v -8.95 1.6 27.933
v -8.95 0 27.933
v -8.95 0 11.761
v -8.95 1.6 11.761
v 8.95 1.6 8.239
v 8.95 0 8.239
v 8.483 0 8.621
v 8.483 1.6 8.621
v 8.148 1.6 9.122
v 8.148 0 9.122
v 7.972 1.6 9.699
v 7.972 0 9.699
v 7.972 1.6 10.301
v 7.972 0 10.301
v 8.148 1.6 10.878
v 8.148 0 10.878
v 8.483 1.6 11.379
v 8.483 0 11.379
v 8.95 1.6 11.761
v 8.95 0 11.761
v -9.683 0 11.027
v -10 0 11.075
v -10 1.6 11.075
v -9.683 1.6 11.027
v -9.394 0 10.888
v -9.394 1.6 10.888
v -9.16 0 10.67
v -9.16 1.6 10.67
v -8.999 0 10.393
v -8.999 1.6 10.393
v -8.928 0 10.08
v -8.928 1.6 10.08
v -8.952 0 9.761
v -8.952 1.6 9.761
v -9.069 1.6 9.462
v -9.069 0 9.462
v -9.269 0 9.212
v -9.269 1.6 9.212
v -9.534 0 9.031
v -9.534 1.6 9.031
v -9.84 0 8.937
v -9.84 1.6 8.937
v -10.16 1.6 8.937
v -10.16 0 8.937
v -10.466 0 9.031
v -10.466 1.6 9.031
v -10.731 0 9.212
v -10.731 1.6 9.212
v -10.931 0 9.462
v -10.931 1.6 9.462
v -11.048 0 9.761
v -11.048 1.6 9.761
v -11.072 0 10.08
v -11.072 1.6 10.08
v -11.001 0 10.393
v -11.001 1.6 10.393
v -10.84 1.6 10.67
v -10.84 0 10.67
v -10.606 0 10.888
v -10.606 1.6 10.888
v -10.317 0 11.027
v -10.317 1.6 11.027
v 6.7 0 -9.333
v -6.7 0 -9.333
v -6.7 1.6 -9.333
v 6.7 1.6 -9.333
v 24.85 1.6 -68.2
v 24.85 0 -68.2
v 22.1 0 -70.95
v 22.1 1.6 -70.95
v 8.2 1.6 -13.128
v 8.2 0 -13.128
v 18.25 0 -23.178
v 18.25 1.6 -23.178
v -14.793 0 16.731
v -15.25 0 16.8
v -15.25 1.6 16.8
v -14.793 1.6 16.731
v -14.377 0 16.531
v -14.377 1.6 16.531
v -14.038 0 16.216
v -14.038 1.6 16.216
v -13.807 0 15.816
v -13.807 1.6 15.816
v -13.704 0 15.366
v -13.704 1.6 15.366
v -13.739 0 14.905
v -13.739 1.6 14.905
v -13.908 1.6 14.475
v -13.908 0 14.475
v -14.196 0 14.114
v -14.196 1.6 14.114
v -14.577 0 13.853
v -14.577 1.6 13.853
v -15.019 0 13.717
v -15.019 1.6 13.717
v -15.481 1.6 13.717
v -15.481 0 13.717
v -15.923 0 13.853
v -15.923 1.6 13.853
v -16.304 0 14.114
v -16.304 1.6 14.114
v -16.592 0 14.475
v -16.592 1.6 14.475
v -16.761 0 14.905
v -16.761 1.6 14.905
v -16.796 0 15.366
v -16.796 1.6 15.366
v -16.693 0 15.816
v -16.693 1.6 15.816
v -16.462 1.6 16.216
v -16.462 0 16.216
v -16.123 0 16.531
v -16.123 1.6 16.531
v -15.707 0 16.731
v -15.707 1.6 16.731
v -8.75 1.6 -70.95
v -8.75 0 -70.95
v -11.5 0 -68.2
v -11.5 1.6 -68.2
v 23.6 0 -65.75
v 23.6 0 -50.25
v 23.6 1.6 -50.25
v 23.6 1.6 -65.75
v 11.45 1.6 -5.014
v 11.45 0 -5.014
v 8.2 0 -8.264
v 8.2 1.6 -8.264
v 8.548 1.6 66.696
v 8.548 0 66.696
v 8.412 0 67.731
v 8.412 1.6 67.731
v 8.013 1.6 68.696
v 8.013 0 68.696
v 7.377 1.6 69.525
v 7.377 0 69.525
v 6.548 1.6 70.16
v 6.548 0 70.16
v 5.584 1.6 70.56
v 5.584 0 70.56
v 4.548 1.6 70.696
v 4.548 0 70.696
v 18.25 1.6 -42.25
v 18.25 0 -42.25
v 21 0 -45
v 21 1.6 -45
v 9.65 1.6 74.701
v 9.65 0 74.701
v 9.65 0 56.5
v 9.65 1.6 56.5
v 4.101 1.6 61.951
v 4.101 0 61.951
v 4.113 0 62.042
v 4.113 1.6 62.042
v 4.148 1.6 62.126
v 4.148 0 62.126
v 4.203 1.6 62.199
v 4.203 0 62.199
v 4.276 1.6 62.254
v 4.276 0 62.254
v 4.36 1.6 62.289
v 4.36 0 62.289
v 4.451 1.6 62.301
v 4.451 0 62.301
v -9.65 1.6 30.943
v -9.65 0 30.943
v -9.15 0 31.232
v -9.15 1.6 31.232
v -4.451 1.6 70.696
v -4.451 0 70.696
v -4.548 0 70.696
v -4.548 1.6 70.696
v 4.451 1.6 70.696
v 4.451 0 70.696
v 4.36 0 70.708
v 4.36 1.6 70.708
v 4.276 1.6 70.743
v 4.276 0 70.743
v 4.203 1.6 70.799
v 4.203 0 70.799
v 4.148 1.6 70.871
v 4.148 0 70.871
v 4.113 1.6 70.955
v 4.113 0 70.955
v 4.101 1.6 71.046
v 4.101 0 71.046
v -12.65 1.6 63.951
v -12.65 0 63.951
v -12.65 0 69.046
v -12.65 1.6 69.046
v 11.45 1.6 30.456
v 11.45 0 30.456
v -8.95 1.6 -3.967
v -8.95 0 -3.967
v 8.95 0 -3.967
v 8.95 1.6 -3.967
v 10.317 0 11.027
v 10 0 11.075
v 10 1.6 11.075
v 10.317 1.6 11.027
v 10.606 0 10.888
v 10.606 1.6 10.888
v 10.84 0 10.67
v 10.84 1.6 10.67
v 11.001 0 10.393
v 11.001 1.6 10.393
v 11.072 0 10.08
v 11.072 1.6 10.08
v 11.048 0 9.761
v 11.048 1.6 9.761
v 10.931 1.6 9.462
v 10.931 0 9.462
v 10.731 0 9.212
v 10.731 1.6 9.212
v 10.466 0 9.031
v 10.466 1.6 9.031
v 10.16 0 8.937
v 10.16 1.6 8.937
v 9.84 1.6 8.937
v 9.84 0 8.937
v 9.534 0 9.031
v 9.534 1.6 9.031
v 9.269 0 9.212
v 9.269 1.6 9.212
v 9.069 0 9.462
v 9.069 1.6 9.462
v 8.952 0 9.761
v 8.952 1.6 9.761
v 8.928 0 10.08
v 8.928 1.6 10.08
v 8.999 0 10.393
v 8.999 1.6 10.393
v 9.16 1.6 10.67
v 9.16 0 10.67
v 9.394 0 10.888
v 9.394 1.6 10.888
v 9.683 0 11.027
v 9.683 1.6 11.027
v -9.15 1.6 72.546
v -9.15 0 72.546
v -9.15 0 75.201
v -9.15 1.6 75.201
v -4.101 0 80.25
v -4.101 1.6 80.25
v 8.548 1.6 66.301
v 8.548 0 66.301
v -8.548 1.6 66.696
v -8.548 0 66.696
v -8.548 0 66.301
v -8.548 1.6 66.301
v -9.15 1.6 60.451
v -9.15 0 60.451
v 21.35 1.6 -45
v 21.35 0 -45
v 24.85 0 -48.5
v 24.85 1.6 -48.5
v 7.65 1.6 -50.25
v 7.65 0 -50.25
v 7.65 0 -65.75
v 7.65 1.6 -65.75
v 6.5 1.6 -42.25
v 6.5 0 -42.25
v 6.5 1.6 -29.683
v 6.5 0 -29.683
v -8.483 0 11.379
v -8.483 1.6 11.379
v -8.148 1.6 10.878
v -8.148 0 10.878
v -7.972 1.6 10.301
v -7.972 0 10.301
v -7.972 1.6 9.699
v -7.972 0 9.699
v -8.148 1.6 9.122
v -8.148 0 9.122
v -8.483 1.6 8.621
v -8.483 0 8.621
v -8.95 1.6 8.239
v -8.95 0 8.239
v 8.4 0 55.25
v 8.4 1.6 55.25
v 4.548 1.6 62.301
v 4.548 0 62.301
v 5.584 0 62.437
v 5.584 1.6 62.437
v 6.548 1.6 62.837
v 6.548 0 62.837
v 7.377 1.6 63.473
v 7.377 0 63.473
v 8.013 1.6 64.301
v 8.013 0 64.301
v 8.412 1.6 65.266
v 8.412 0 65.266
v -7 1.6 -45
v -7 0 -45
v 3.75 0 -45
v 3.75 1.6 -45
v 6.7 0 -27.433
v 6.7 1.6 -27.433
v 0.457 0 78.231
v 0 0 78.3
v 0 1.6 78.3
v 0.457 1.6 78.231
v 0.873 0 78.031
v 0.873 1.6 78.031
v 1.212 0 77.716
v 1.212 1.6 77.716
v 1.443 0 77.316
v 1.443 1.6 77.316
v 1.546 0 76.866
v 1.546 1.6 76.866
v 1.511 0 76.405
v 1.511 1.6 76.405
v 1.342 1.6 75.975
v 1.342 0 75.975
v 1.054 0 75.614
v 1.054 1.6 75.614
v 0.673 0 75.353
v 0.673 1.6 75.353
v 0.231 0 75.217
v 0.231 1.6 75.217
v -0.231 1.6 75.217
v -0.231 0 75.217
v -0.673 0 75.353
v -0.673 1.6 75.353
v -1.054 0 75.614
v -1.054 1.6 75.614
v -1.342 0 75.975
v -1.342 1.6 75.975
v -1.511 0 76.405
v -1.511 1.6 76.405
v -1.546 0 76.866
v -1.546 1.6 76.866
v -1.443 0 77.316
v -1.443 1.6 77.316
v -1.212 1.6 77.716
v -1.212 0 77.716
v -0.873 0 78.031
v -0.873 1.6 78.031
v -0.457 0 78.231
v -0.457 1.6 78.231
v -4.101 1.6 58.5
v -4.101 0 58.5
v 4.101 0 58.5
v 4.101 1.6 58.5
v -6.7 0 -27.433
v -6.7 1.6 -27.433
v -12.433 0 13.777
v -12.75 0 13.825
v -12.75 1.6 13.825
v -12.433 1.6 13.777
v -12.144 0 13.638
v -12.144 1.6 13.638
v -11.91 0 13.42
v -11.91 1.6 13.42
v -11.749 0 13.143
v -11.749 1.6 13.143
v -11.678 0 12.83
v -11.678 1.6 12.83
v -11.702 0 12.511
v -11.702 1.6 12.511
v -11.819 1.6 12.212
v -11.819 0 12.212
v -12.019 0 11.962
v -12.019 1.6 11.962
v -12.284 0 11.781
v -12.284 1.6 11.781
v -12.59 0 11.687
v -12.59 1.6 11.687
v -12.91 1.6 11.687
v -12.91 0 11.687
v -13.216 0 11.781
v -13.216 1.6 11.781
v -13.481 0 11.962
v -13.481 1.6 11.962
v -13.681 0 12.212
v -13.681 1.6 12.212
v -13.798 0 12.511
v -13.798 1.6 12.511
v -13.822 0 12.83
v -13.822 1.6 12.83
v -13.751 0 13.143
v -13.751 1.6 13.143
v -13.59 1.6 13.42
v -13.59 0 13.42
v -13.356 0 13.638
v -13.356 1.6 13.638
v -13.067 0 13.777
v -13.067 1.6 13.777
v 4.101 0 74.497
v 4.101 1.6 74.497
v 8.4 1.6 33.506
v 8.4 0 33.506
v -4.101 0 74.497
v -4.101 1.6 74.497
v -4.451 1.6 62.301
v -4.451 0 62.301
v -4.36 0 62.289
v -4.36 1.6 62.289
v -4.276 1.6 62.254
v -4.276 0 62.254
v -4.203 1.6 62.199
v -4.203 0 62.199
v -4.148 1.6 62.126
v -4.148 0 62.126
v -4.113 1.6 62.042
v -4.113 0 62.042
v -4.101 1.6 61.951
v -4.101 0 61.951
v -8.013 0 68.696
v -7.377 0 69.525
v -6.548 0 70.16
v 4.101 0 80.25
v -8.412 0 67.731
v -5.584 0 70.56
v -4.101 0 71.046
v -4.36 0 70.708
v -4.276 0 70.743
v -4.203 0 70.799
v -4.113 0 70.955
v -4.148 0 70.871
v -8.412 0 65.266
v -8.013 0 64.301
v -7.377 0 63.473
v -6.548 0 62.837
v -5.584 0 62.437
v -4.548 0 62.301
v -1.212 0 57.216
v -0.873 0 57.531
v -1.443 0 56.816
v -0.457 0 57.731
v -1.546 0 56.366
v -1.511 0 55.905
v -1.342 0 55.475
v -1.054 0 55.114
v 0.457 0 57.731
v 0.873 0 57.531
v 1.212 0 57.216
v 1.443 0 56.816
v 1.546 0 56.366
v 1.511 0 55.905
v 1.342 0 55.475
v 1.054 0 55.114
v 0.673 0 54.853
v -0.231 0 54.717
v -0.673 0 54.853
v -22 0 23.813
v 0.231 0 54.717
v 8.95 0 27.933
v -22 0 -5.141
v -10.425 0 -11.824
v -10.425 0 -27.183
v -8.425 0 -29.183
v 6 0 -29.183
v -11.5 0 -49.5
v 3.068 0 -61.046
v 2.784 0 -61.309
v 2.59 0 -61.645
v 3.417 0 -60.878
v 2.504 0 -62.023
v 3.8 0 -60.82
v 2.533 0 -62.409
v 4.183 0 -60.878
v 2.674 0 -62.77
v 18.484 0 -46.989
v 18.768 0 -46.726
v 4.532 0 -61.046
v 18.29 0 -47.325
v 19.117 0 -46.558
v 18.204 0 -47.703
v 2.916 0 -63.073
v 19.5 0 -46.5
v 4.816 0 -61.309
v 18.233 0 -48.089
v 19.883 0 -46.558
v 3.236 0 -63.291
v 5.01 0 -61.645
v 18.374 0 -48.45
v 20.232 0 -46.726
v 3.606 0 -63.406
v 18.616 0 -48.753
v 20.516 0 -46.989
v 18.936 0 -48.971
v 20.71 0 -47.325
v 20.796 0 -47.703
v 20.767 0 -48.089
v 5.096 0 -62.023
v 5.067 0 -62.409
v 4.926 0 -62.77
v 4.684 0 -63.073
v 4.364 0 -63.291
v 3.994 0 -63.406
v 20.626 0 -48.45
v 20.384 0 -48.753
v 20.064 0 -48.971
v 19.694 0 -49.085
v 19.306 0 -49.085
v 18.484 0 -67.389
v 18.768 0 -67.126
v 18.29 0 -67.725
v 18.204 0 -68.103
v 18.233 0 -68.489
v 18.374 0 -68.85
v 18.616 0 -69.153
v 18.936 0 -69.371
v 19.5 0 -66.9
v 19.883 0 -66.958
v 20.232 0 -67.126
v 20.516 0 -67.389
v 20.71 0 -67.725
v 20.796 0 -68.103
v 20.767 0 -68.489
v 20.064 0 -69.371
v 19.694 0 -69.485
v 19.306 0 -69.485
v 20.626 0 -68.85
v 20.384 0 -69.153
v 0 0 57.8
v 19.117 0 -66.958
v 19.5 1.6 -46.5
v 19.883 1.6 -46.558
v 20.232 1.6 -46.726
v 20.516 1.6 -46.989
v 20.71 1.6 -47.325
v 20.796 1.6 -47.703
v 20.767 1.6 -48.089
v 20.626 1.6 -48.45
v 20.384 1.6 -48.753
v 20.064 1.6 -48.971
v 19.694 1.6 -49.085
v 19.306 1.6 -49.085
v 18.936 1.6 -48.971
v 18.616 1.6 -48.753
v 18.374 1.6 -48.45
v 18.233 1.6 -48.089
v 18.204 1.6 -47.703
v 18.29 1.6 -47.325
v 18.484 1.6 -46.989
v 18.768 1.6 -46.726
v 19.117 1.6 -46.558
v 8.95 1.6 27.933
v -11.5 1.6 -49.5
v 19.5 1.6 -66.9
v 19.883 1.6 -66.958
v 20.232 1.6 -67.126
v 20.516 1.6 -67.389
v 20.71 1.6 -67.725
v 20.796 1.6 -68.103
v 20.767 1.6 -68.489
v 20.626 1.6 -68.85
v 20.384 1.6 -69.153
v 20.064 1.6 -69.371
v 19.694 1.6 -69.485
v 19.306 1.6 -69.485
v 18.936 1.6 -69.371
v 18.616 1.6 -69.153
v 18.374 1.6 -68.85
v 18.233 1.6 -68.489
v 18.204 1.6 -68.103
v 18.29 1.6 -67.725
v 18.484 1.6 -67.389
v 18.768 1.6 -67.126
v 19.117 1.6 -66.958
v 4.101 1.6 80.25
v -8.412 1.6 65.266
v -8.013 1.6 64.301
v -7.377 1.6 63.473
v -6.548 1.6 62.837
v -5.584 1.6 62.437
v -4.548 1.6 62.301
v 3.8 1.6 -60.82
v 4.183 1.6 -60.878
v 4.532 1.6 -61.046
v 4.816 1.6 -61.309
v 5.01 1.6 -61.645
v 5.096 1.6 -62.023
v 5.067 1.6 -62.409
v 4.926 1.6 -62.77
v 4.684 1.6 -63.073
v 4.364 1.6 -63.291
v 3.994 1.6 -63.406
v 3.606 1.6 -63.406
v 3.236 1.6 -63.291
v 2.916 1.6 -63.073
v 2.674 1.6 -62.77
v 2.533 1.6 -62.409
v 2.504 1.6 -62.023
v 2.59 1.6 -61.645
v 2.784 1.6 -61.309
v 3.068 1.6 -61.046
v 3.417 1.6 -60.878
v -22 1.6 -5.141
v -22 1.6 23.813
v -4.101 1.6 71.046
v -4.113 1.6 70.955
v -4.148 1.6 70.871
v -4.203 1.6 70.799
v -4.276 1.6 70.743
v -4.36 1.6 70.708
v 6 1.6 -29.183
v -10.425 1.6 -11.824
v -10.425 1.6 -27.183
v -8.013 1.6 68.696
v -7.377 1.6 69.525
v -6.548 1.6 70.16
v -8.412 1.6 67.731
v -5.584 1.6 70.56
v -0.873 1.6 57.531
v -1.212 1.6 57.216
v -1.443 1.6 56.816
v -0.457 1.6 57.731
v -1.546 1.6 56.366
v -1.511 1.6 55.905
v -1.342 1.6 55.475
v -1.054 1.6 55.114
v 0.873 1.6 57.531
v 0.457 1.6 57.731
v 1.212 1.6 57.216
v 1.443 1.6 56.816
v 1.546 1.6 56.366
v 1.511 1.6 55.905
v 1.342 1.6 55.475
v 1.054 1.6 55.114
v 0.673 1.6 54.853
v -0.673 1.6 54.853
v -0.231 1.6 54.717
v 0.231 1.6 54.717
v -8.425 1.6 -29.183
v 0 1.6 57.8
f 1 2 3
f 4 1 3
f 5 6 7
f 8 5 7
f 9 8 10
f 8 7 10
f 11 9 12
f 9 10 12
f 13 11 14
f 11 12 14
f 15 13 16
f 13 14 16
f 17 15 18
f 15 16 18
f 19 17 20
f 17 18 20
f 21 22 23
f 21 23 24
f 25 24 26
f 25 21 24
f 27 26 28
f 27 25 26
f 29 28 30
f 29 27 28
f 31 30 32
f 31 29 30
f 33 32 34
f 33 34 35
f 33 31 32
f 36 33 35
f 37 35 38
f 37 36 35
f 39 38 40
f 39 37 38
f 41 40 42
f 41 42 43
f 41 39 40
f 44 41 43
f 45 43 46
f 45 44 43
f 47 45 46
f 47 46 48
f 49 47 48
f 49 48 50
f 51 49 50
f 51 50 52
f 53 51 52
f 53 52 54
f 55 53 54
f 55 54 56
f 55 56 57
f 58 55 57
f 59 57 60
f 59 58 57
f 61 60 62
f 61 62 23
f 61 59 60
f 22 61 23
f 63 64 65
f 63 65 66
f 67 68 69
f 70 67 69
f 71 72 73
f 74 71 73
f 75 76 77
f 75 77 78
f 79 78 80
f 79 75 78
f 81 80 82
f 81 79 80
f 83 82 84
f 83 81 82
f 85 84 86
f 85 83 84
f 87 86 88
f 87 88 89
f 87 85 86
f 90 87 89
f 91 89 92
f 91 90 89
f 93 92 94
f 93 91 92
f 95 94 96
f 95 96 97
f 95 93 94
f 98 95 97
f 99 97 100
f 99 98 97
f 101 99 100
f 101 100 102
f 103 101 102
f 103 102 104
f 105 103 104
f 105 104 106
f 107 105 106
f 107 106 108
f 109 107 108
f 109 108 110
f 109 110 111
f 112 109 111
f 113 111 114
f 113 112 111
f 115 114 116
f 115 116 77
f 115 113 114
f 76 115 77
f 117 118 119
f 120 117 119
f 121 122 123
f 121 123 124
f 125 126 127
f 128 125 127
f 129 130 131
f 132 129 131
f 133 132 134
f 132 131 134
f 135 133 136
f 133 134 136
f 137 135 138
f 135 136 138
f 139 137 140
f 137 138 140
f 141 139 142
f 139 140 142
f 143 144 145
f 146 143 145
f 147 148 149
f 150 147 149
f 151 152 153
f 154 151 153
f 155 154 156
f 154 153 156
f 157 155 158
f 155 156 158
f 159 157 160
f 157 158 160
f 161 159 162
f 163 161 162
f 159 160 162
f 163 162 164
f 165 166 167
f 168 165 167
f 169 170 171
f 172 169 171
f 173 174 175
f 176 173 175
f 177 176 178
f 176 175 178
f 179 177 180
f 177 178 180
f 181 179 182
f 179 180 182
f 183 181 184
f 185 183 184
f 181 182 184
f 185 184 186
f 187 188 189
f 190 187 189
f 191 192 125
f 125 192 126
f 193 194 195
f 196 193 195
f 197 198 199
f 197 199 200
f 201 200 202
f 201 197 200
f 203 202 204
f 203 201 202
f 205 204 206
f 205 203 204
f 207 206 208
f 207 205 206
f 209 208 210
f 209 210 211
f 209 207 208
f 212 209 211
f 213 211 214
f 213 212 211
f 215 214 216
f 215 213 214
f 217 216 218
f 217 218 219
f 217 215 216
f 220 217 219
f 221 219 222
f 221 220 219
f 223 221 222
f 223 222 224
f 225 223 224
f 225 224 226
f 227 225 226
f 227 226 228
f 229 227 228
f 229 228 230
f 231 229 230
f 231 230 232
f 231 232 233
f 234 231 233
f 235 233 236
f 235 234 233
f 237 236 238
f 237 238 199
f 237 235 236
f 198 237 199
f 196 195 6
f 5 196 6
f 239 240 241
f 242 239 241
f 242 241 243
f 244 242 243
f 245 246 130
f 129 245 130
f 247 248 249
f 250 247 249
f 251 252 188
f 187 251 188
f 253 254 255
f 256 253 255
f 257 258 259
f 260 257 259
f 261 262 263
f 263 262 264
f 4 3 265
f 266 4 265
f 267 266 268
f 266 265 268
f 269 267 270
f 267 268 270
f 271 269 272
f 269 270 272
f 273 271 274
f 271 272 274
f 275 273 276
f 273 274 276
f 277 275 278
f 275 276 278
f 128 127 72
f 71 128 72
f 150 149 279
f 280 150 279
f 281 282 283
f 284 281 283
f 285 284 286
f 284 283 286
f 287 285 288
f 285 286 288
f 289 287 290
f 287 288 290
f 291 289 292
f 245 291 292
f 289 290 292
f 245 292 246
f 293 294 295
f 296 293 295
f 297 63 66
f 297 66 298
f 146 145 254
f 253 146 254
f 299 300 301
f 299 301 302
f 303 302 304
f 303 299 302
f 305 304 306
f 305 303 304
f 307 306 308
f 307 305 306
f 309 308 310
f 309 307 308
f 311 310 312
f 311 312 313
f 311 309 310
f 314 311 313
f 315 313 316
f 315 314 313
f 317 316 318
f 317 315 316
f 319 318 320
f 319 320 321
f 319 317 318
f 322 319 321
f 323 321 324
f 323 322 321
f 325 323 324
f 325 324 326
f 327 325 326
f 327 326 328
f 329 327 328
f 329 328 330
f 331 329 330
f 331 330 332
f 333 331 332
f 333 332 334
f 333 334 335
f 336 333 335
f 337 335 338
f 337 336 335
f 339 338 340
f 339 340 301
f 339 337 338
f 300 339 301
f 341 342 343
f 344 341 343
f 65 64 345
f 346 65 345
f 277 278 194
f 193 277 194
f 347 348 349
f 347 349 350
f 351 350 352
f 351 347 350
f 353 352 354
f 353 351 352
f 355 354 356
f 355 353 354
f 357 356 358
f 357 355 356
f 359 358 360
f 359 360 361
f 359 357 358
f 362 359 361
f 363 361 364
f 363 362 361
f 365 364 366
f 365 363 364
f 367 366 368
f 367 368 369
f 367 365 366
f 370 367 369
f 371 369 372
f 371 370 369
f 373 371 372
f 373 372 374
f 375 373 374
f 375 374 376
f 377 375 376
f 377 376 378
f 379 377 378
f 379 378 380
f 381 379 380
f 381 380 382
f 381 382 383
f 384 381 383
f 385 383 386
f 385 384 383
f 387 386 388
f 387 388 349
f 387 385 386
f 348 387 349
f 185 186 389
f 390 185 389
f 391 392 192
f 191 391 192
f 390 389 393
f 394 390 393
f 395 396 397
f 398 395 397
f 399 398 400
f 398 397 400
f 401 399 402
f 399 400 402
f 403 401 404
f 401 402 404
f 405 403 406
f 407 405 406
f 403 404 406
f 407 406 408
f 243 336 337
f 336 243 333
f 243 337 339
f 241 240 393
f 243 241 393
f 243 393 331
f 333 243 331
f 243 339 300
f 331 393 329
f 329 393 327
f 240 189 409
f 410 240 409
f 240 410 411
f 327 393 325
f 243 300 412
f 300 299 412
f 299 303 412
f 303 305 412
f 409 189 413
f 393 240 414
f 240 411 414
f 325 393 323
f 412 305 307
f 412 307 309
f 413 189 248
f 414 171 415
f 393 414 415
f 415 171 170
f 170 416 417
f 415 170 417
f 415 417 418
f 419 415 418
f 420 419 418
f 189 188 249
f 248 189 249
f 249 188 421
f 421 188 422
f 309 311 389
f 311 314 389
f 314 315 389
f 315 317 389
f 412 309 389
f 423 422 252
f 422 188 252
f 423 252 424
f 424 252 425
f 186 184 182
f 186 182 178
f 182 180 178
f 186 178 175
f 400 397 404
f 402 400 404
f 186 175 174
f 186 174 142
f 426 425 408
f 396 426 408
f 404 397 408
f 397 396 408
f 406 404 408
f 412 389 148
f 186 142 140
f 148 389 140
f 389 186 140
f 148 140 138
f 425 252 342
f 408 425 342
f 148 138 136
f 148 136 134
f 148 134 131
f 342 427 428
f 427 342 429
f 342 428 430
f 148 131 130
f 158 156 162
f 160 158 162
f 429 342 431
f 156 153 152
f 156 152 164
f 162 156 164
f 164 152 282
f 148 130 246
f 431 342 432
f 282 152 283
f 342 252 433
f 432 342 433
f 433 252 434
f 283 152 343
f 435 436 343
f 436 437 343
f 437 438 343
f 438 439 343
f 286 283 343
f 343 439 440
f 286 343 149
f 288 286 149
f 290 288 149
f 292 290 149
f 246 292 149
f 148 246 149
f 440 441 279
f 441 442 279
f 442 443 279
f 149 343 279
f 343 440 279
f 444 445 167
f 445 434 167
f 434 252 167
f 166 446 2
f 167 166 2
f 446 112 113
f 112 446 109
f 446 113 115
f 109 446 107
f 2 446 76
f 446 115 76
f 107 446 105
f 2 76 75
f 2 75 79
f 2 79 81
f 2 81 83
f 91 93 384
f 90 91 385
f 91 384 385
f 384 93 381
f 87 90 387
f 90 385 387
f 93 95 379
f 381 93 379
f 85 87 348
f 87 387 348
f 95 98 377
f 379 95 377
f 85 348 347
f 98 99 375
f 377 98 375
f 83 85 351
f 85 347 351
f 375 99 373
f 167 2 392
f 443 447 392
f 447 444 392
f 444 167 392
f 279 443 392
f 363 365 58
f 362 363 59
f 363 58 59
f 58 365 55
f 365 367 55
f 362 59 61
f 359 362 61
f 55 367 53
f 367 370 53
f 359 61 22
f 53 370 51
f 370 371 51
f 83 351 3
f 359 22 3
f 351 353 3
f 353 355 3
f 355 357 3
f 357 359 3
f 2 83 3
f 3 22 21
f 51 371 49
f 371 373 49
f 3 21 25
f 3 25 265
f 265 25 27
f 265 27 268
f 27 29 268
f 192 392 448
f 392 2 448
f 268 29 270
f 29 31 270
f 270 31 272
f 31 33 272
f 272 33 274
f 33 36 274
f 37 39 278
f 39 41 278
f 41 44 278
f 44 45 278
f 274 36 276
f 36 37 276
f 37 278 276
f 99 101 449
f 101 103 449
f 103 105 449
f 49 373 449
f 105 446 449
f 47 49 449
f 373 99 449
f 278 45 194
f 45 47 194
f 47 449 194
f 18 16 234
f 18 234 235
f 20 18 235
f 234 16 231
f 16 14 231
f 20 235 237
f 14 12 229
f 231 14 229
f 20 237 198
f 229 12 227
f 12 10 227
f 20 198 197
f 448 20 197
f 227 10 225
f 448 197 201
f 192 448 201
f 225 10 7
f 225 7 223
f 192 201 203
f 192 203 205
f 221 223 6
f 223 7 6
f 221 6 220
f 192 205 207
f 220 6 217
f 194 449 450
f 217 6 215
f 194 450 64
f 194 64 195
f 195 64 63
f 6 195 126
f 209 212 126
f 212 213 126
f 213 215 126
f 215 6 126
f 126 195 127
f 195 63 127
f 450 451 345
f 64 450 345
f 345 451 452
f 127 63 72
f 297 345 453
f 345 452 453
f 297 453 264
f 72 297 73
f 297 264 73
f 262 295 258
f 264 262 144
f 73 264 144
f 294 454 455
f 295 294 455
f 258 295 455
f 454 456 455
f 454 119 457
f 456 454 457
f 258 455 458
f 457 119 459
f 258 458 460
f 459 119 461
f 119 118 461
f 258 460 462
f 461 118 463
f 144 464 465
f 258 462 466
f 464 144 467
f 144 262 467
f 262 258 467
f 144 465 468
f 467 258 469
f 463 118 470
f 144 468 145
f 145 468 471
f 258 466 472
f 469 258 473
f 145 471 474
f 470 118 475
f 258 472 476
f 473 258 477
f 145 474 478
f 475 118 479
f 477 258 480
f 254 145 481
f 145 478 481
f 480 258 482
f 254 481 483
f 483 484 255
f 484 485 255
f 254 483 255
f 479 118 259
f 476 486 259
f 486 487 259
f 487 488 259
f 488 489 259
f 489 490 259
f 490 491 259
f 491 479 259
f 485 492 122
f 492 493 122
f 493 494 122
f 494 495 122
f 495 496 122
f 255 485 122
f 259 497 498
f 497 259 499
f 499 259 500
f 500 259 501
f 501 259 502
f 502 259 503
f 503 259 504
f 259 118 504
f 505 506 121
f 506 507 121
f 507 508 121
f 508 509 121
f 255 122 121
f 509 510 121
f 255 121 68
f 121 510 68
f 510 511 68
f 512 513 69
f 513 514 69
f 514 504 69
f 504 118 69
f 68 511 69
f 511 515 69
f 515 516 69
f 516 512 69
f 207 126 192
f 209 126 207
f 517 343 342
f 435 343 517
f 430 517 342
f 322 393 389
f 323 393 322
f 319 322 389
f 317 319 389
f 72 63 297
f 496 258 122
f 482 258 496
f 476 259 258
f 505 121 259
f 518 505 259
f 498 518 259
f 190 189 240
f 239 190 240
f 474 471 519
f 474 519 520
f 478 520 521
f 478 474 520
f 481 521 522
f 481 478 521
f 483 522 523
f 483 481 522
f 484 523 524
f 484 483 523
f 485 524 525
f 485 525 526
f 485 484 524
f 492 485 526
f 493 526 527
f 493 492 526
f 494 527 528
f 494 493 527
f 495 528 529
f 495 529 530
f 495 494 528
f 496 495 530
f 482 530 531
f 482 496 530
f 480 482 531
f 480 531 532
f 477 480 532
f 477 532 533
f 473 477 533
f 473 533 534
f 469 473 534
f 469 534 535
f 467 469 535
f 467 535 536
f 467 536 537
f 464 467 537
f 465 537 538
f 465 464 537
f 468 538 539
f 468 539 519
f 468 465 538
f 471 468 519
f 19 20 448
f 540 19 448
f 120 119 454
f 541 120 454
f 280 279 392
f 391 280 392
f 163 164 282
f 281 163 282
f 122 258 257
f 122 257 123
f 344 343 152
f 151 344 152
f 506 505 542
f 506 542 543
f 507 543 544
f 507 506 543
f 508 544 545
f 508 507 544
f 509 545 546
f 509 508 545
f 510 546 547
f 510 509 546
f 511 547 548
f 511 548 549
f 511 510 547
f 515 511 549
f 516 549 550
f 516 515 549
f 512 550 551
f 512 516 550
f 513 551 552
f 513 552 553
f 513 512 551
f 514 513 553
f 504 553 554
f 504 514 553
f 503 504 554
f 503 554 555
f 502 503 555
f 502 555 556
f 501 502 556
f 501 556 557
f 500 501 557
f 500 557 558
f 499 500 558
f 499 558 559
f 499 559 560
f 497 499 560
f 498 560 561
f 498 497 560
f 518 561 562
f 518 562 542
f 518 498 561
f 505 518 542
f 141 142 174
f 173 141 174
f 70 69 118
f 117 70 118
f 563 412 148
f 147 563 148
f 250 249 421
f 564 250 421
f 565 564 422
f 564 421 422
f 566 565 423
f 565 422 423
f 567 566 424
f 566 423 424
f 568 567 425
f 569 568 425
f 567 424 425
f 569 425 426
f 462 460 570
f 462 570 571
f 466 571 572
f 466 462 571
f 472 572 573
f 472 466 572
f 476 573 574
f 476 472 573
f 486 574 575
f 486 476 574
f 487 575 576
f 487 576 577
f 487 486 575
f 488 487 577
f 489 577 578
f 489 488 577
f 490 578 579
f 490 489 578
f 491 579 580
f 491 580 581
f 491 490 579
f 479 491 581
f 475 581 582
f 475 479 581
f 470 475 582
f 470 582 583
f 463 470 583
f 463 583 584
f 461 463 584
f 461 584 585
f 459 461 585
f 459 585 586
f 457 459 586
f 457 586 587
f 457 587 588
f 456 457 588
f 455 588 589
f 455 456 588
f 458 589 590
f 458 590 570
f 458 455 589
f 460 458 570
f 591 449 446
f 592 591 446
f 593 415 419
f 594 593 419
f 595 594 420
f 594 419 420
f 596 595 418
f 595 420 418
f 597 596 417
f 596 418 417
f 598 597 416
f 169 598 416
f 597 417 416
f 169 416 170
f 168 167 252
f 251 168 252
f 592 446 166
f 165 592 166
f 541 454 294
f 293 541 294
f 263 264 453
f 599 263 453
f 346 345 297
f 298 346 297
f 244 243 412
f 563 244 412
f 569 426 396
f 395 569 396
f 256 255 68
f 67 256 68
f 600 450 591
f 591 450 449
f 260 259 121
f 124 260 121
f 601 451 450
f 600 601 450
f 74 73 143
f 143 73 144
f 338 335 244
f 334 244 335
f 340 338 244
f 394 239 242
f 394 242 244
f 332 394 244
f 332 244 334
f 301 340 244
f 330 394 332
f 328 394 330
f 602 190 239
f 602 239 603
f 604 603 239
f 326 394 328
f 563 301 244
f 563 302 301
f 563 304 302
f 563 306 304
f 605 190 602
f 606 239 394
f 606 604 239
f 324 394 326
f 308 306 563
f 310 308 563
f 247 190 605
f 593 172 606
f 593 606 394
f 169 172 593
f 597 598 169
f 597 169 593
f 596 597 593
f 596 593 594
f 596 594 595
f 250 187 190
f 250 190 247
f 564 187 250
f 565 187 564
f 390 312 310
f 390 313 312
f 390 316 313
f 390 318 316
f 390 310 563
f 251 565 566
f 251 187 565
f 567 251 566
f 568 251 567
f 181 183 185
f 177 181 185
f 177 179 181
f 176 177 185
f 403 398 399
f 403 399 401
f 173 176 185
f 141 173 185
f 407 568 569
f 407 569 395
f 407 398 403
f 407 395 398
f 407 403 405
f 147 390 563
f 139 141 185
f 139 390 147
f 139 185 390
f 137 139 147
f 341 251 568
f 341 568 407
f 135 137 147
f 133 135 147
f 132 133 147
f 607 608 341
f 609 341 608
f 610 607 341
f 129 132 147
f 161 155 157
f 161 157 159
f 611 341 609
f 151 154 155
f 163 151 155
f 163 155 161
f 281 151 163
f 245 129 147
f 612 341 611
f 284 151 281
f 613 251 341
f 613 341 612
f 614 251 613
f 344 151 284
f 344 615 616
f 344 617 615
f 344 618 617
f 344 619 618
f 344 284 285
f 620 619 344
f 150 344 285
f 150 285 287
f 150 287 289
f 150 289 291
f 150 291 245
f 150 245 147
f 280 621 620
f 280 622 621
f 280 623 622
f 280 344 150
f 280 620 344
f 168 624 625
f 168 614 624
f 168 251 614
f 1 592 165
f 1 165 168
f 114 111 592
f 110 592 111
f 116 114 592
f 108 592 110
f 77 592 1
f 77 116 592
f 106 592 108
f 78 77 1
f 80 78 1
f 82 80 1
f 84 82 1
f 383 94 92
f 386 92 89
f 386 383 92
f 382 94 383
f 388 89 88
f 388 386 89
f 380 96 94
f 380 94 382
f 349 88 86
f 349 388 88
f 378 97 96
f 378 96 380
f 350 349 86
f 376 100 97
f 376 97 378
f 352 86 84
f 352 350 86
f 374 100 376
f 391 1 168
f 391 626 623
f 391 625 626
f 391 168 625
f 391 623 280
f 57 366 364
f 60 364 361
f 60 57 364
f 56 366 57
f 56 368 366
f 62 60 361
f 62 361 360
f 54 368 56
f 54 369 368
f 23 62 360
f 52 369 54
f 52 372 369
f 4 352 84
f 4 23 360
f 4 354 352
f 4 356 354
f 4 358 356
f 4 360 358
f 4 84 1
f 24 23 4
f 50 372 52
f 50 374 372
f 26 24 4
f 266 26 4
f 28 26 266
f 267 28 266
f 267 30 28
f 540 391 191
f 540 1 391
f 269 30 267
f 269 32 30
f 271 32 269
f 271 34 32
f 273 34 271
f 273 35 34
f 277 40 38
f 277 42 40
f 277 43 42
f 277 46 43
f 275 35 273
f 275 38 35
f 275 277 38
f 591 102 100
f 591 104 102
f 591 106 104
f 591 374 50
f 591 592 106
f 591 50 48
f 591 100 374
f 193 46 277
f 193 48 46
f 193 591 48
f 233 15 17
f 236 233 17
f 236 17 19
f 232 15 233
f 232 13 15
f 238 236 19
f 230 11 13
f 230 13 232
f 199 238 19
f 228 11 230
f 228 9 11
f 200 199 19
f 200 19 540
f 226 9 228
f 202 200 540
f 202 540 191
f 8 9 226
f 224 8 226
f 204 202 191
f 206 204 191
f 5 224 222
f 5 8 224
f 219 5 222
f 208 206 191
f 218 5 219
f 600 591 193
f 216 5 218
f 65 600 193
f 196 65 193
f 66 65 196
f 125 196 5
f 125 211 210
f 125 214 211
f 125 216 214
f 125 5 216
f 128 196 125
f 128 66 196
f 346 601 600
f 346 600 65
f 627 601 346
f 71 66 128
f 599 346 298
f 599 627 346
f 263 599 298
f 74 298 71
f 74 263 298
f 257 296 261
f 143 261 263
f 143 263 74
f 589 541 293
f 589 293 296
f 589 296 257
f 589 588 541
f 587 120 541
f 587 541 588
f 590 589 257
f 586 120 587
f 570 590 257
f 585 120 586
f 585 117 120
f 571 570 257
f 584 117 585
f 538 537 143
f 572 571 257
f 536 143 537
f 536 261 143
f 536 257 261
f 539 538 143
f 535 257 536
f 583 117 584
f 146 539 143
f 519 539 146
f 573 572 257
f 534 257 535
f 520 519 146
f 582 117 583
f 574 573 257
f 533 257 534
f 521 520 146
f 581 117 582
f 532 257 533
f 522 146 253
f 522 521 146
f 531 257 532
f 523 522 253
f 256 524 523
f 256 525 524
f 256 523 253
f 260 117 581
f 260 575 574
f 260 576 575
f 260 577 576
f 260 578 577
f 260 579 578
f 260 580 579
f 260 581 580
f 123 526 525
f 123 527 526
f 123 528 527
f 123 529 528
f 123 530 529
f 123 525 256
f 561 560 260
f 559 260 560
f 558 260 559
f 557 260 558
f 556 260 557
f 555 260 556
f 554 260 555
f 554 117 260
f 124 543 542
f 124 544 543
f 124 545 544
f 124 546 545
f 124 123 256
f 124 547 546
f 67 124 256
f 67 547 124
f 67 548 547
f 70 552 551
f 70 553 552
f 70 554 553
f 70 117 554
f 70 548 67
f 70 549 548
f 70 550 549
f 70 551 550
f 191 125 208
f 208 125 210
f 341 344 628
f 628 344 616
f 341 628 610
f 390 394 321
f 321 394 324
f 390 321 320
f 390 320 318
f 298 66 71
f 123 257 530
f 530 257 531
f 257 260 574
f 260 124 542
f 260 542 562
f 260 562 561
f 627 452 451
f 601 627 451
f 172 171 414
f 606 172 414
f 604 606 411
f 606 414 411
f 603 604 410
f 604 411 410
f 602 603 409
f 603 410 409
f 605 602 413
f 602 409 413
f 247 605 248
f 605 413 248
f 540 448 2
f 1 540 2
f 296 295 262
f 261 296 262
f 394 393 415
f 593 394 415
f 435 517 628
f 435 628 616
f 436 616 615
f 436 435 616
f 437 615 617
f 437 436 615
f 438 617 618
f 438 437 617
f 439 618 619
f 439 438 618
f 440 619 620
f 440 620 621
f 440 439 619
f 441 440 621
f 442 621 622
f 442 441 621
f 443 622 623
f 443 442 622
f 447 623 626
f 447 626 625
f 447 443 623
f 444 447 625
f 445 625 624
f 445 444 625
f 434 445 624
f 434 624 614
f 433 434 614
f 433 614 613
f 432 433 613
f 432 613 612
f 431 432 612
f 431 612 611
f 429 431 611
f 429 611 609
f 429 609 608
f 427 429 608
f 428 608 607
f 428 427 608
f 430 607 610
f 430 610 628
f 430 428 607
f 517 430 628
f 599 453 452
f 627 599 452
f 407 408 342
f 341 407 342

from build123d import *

# Parameters (mm, degrees)
SKETCH_9688_R   = 1.55
SKETCH_9688_R_2 = 1.075
SKETCH_9688_W   = 13.4
SKETCH_9688_H   = 18.1
SKETCH_9688_R_3 = 1.3
SKETCH_9688_W_2 = 15.95
SKETCH_9688_H_2 = 15.5
PCB_DEPTH       = 1.6


with BuildPart() as part:
    # Sketch 9688 → 主结构-PCB最大范围-实际可以比这个小 (new body)
    with BuildSketch(Plane(origin=(0, 0, 0), x_dir=(1, 0, 0), z_dir=(0, 1, 0))):
        Polygon((3.75, 45), (6.5, 42.25), (6.5, 29.683072379), (6, 29.183072379), (-8.425, 29.183072379), (-10.425, 27.183072379), (-10.425, 11.824221247), (-22, 5.141391882), (-22, -23.812684418), (-9.65, -30.942960242), (-9.15, -31.231635377), (-9.15, -34.122764912), (-9.15, -60.451116293), (-12.65, -63.951116293), (-12.65, -69.046082783), (-9.15, -72.546082783), (-9.15, -75.200927376), (-4.100927376, -80.25), (4.100927376, -80.25), (9.65, -74.700927376), (9.65, -56.5), (8.4, -55.25), (8.4, -33.506128091), (11.45, -30.456128091), (11.45, 5.014466094), (8.2, 8.264466094), (8.2, 13.127500889), (18.25, 23.177500889), (18.25, 30.170693918), (18.25, 42.25), (21, 45), (21.35, 45), (24.85, 48.5), (24.85, 68.199999999), (22.1, 70.949999999), (-8.75, 70.949999999), (-11.5, 68.199999999), (-11.5, 49.5), (-7, 45), align=None)
        with Locations(Location((0, -76.75, 0), (0, 0, 270))):
            Circle(SKETCH_9688_R, mode=Mode.SUBTRACT)
        with BuildLine():
            Line((-4.100927376, -61.951116293), (-4.100927376, -58.5))
            Line((-4.100927376, -58.5), (-0.000927376, -58.5))
            Line((-0.000927376, -58.5), (0.000927376, -58.5))
            Line((0.000927376, -58.5), (4.100927376, -58.5))
            Line((4.100927376, -58.5), (4.100927376, -61.951116293))
            ThreePointArc((4.100927376, -61.951116293), (4.203440002, -62.198603667), (4.450927376, -62.301116293))
            Line((4.450927376, -62.301116293), (4.54842161, -62.301116293))
            ThreePointArc((4.54842161, -62.301116293), (7.376848734, -63.472689168), (8.54842161, -66.301116291))
            Line((8.54842161, -66.301116291), (8.54842161, -66.696082786))
            ThreePointArc((8.54842161, -66.696082786), (7.376848734, -69.524509909), (4.54842161, -70.696082783))
            Line((4.54842161, -70.696082783), (4.450927376, -70.696082783))
            ThreePointArc((4.450927376, -70.696082783), (4.203440002, -70.79859541), (4.100927376, -71.046082783))
            Line((4.100927376, -71.046082783), (4.100927376, -74.497199077))
            Line((4.100927376, -74.497199077), (0.000927376, -74.497199077))
            Line((0.000927376, -74.497199077), (-0.000927376, -74.497199077))
            Line((-0.000927376, -74.497199077), (-4.100927376, -74.497199077))
            Line((-4.100927376, -74.497199077), (-4.100927376, -71.046082783))
            ThreePointArc((-4.100927376, -71.046082783), (-4.203440002, -70.79859541), (-4.450927376, -70.696082783))
            Line((-4.450927376, -70.696082783), (-4.54842161, -70.696082783))
            ThreePointArc((-4.54842161, -70.696082783), (-7.376848734, -69.524509909), (-8.54842161, -66.696082786))
            Line((-8.54842161, -66.696082786), (-8.54842161, -66.301116291))
            ThreePointArc((-8.54842161, -66.301116291), (-7.376848734, -63.472689168), (-4.54842161, -62.301116293))
            Line((-4.54842161, -62.301116293), (-4.450927376, -62.301116293))
            ThreePointArc((-4.450927376, -62.301116293), (-4.203440002, -62.198603667), (-4.100927376, -61.951116293))
        make_face(mode=Mode.SUBTRACT)
        with Locations(Location((0, -56.25, 0), (0, 0, 270))):
            Circle(SKETCH_9688_R, mode=Mode.SUBTRACT)
        with Locations(Location((-15.25, -15.25, 0), (0, 0, 270))):
            Circle(SKETCH_9688_R, mode=Mode.SUBTRACT)
        with Locations(Location((-12.75, -12.75, 0), (0, 0, 270))):
            Circle(SKETCH_9688_R_2, mode=Mode.SUBTRACT)
        with Locations(Location((-10, -10, 0), (0, 0, 270))):
            Circle(SKETCH_9688_R_2, mode=Mode.SUBTRACT)
        with BuildLine():
            Line((-8.95, -8.239318314), (-8.95, 3.966927621))
            Line((-8.95, 3.966927621), (8.95, 3.966927621))
            Line((8.95, 3.966927621), (8.95, -8.239318314))
            ThreePointArc((8.95, -8.239318314), (7.95, -10), (8.95, -11.760681686))
            Line((8.95, -11.760681686), (8.95, -27.933072379))
            Line((8.95, -27.933072379), (-8.95, -27.933072379))
            Line((-8.95, -27.933072379), (-8.95, -11.760681686))
            ThreePointArc((-8.95, -11.760681686), (-7.95, -10), (-8.95, -8.239318314))
        make_face(mode=Mode.SUBTRACT)
        with Locations(Location((10, -10, 0), (0, 0, 270))):
            Circle(SKETCH_9688_R_2, mode=Mode.SUBTRACT)
        with Locations((0, 18.383072379)):
            Rectangle(SKETCH_9688_W, SKETCH_9688_H, mode=Mode.SUBTRACT)
        with Locations(Location((3.8, 62.12002051, 0), (0, 0, 270))):
            Circle(SKETCH_9688_R_3, mode=Mode.SUBTRACT)
        with Locations(Location((19.5, 47.800000001, 0), (0, 0, 270))):
            Circle(SKETCH_9688_R_3, mode=Mode.SUBTRACT)
        with Locations((15.625, 58)):
            Rectangle(SKETCH_9688_W_2, SKETCH_9688_H_2, mode=Mode.SUBTRACT)
        with Locations(Location((19.5, 68.199999999, 0), (0, 0, 270))):
            Circle(SKETCH_9688_R_3, mode=Mode.SUBTRACT)
    extrude(amount=PCB_DEPTH)


solid = part.part
